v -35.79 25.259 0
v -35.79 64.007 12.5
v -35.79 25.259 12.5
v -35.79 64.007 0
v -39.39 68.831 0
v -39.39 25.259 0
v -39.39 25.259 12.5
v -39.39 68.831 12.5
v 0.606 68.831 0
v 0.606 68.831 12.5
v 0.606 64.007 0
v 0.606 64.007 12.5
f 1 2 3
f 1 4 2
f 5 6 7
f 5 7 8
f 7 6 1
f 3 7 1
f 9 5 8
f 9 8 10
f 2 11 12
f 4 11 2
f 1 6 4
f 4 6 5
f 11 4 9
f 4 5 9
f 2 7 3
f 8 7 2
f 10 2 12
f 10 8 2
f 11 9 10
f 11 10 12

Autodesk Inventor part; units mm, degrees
ref_plane "YZ Plane" through (0, 0, 0) normal (1, 0, 0) x (0, 1, 0)
ref_plane "XZ Plane" through (0, 0, 0) normal (0, 1, 0) x (-1, 0, 0)
sketch "Sketch2" plane through (0, 0, 0) normal (0, 0, 1) x (1, 0, 0)
  line L0 (0.6059, 79.2071) -> (0.6059, 64.0071) projected
  line L1 (-21.8941, 64.0071) -> (-21.8941, 79.2071) projected
  line L2 (-35.7896, 30.0586) -> (-39.3896, 30.0586) projected
  line L3 (-39.3896, 25.2586) -> (-35.7896, 25.2586) projected
  line L4 (-35.7896, 25.2586) -> (-39.3896, 25.2586)
  line L5 (-39.3896, 25.2586) -> (-39.3896, 68.8314)
  line L6 (-35.7896, 64.0071) -> (-35.7896, 25.2586)
  line L7 (0.6059, 64.0071) -> (-35.7896, 64.0071)
  line L8 (-39.3896, 64.0071) -> (-39.3896, 68.8314)
  line L9 (-39.3896, 68.8314) -> (0.6059, 68.8314)
  line L10 (0.6059, 68.8314) -> (0.6059, 64.0071)
  point P0 (0, 0)
ref_plane "Work Plane1" through (-26.6941, 57.0071, 12.5) normal (0, 0, 1) x (1, 0, 0)
extrude "Extrusion1" add sketch "Sketch2" along normal up to surface (12.5 mm away)
properties part number "frame2"
